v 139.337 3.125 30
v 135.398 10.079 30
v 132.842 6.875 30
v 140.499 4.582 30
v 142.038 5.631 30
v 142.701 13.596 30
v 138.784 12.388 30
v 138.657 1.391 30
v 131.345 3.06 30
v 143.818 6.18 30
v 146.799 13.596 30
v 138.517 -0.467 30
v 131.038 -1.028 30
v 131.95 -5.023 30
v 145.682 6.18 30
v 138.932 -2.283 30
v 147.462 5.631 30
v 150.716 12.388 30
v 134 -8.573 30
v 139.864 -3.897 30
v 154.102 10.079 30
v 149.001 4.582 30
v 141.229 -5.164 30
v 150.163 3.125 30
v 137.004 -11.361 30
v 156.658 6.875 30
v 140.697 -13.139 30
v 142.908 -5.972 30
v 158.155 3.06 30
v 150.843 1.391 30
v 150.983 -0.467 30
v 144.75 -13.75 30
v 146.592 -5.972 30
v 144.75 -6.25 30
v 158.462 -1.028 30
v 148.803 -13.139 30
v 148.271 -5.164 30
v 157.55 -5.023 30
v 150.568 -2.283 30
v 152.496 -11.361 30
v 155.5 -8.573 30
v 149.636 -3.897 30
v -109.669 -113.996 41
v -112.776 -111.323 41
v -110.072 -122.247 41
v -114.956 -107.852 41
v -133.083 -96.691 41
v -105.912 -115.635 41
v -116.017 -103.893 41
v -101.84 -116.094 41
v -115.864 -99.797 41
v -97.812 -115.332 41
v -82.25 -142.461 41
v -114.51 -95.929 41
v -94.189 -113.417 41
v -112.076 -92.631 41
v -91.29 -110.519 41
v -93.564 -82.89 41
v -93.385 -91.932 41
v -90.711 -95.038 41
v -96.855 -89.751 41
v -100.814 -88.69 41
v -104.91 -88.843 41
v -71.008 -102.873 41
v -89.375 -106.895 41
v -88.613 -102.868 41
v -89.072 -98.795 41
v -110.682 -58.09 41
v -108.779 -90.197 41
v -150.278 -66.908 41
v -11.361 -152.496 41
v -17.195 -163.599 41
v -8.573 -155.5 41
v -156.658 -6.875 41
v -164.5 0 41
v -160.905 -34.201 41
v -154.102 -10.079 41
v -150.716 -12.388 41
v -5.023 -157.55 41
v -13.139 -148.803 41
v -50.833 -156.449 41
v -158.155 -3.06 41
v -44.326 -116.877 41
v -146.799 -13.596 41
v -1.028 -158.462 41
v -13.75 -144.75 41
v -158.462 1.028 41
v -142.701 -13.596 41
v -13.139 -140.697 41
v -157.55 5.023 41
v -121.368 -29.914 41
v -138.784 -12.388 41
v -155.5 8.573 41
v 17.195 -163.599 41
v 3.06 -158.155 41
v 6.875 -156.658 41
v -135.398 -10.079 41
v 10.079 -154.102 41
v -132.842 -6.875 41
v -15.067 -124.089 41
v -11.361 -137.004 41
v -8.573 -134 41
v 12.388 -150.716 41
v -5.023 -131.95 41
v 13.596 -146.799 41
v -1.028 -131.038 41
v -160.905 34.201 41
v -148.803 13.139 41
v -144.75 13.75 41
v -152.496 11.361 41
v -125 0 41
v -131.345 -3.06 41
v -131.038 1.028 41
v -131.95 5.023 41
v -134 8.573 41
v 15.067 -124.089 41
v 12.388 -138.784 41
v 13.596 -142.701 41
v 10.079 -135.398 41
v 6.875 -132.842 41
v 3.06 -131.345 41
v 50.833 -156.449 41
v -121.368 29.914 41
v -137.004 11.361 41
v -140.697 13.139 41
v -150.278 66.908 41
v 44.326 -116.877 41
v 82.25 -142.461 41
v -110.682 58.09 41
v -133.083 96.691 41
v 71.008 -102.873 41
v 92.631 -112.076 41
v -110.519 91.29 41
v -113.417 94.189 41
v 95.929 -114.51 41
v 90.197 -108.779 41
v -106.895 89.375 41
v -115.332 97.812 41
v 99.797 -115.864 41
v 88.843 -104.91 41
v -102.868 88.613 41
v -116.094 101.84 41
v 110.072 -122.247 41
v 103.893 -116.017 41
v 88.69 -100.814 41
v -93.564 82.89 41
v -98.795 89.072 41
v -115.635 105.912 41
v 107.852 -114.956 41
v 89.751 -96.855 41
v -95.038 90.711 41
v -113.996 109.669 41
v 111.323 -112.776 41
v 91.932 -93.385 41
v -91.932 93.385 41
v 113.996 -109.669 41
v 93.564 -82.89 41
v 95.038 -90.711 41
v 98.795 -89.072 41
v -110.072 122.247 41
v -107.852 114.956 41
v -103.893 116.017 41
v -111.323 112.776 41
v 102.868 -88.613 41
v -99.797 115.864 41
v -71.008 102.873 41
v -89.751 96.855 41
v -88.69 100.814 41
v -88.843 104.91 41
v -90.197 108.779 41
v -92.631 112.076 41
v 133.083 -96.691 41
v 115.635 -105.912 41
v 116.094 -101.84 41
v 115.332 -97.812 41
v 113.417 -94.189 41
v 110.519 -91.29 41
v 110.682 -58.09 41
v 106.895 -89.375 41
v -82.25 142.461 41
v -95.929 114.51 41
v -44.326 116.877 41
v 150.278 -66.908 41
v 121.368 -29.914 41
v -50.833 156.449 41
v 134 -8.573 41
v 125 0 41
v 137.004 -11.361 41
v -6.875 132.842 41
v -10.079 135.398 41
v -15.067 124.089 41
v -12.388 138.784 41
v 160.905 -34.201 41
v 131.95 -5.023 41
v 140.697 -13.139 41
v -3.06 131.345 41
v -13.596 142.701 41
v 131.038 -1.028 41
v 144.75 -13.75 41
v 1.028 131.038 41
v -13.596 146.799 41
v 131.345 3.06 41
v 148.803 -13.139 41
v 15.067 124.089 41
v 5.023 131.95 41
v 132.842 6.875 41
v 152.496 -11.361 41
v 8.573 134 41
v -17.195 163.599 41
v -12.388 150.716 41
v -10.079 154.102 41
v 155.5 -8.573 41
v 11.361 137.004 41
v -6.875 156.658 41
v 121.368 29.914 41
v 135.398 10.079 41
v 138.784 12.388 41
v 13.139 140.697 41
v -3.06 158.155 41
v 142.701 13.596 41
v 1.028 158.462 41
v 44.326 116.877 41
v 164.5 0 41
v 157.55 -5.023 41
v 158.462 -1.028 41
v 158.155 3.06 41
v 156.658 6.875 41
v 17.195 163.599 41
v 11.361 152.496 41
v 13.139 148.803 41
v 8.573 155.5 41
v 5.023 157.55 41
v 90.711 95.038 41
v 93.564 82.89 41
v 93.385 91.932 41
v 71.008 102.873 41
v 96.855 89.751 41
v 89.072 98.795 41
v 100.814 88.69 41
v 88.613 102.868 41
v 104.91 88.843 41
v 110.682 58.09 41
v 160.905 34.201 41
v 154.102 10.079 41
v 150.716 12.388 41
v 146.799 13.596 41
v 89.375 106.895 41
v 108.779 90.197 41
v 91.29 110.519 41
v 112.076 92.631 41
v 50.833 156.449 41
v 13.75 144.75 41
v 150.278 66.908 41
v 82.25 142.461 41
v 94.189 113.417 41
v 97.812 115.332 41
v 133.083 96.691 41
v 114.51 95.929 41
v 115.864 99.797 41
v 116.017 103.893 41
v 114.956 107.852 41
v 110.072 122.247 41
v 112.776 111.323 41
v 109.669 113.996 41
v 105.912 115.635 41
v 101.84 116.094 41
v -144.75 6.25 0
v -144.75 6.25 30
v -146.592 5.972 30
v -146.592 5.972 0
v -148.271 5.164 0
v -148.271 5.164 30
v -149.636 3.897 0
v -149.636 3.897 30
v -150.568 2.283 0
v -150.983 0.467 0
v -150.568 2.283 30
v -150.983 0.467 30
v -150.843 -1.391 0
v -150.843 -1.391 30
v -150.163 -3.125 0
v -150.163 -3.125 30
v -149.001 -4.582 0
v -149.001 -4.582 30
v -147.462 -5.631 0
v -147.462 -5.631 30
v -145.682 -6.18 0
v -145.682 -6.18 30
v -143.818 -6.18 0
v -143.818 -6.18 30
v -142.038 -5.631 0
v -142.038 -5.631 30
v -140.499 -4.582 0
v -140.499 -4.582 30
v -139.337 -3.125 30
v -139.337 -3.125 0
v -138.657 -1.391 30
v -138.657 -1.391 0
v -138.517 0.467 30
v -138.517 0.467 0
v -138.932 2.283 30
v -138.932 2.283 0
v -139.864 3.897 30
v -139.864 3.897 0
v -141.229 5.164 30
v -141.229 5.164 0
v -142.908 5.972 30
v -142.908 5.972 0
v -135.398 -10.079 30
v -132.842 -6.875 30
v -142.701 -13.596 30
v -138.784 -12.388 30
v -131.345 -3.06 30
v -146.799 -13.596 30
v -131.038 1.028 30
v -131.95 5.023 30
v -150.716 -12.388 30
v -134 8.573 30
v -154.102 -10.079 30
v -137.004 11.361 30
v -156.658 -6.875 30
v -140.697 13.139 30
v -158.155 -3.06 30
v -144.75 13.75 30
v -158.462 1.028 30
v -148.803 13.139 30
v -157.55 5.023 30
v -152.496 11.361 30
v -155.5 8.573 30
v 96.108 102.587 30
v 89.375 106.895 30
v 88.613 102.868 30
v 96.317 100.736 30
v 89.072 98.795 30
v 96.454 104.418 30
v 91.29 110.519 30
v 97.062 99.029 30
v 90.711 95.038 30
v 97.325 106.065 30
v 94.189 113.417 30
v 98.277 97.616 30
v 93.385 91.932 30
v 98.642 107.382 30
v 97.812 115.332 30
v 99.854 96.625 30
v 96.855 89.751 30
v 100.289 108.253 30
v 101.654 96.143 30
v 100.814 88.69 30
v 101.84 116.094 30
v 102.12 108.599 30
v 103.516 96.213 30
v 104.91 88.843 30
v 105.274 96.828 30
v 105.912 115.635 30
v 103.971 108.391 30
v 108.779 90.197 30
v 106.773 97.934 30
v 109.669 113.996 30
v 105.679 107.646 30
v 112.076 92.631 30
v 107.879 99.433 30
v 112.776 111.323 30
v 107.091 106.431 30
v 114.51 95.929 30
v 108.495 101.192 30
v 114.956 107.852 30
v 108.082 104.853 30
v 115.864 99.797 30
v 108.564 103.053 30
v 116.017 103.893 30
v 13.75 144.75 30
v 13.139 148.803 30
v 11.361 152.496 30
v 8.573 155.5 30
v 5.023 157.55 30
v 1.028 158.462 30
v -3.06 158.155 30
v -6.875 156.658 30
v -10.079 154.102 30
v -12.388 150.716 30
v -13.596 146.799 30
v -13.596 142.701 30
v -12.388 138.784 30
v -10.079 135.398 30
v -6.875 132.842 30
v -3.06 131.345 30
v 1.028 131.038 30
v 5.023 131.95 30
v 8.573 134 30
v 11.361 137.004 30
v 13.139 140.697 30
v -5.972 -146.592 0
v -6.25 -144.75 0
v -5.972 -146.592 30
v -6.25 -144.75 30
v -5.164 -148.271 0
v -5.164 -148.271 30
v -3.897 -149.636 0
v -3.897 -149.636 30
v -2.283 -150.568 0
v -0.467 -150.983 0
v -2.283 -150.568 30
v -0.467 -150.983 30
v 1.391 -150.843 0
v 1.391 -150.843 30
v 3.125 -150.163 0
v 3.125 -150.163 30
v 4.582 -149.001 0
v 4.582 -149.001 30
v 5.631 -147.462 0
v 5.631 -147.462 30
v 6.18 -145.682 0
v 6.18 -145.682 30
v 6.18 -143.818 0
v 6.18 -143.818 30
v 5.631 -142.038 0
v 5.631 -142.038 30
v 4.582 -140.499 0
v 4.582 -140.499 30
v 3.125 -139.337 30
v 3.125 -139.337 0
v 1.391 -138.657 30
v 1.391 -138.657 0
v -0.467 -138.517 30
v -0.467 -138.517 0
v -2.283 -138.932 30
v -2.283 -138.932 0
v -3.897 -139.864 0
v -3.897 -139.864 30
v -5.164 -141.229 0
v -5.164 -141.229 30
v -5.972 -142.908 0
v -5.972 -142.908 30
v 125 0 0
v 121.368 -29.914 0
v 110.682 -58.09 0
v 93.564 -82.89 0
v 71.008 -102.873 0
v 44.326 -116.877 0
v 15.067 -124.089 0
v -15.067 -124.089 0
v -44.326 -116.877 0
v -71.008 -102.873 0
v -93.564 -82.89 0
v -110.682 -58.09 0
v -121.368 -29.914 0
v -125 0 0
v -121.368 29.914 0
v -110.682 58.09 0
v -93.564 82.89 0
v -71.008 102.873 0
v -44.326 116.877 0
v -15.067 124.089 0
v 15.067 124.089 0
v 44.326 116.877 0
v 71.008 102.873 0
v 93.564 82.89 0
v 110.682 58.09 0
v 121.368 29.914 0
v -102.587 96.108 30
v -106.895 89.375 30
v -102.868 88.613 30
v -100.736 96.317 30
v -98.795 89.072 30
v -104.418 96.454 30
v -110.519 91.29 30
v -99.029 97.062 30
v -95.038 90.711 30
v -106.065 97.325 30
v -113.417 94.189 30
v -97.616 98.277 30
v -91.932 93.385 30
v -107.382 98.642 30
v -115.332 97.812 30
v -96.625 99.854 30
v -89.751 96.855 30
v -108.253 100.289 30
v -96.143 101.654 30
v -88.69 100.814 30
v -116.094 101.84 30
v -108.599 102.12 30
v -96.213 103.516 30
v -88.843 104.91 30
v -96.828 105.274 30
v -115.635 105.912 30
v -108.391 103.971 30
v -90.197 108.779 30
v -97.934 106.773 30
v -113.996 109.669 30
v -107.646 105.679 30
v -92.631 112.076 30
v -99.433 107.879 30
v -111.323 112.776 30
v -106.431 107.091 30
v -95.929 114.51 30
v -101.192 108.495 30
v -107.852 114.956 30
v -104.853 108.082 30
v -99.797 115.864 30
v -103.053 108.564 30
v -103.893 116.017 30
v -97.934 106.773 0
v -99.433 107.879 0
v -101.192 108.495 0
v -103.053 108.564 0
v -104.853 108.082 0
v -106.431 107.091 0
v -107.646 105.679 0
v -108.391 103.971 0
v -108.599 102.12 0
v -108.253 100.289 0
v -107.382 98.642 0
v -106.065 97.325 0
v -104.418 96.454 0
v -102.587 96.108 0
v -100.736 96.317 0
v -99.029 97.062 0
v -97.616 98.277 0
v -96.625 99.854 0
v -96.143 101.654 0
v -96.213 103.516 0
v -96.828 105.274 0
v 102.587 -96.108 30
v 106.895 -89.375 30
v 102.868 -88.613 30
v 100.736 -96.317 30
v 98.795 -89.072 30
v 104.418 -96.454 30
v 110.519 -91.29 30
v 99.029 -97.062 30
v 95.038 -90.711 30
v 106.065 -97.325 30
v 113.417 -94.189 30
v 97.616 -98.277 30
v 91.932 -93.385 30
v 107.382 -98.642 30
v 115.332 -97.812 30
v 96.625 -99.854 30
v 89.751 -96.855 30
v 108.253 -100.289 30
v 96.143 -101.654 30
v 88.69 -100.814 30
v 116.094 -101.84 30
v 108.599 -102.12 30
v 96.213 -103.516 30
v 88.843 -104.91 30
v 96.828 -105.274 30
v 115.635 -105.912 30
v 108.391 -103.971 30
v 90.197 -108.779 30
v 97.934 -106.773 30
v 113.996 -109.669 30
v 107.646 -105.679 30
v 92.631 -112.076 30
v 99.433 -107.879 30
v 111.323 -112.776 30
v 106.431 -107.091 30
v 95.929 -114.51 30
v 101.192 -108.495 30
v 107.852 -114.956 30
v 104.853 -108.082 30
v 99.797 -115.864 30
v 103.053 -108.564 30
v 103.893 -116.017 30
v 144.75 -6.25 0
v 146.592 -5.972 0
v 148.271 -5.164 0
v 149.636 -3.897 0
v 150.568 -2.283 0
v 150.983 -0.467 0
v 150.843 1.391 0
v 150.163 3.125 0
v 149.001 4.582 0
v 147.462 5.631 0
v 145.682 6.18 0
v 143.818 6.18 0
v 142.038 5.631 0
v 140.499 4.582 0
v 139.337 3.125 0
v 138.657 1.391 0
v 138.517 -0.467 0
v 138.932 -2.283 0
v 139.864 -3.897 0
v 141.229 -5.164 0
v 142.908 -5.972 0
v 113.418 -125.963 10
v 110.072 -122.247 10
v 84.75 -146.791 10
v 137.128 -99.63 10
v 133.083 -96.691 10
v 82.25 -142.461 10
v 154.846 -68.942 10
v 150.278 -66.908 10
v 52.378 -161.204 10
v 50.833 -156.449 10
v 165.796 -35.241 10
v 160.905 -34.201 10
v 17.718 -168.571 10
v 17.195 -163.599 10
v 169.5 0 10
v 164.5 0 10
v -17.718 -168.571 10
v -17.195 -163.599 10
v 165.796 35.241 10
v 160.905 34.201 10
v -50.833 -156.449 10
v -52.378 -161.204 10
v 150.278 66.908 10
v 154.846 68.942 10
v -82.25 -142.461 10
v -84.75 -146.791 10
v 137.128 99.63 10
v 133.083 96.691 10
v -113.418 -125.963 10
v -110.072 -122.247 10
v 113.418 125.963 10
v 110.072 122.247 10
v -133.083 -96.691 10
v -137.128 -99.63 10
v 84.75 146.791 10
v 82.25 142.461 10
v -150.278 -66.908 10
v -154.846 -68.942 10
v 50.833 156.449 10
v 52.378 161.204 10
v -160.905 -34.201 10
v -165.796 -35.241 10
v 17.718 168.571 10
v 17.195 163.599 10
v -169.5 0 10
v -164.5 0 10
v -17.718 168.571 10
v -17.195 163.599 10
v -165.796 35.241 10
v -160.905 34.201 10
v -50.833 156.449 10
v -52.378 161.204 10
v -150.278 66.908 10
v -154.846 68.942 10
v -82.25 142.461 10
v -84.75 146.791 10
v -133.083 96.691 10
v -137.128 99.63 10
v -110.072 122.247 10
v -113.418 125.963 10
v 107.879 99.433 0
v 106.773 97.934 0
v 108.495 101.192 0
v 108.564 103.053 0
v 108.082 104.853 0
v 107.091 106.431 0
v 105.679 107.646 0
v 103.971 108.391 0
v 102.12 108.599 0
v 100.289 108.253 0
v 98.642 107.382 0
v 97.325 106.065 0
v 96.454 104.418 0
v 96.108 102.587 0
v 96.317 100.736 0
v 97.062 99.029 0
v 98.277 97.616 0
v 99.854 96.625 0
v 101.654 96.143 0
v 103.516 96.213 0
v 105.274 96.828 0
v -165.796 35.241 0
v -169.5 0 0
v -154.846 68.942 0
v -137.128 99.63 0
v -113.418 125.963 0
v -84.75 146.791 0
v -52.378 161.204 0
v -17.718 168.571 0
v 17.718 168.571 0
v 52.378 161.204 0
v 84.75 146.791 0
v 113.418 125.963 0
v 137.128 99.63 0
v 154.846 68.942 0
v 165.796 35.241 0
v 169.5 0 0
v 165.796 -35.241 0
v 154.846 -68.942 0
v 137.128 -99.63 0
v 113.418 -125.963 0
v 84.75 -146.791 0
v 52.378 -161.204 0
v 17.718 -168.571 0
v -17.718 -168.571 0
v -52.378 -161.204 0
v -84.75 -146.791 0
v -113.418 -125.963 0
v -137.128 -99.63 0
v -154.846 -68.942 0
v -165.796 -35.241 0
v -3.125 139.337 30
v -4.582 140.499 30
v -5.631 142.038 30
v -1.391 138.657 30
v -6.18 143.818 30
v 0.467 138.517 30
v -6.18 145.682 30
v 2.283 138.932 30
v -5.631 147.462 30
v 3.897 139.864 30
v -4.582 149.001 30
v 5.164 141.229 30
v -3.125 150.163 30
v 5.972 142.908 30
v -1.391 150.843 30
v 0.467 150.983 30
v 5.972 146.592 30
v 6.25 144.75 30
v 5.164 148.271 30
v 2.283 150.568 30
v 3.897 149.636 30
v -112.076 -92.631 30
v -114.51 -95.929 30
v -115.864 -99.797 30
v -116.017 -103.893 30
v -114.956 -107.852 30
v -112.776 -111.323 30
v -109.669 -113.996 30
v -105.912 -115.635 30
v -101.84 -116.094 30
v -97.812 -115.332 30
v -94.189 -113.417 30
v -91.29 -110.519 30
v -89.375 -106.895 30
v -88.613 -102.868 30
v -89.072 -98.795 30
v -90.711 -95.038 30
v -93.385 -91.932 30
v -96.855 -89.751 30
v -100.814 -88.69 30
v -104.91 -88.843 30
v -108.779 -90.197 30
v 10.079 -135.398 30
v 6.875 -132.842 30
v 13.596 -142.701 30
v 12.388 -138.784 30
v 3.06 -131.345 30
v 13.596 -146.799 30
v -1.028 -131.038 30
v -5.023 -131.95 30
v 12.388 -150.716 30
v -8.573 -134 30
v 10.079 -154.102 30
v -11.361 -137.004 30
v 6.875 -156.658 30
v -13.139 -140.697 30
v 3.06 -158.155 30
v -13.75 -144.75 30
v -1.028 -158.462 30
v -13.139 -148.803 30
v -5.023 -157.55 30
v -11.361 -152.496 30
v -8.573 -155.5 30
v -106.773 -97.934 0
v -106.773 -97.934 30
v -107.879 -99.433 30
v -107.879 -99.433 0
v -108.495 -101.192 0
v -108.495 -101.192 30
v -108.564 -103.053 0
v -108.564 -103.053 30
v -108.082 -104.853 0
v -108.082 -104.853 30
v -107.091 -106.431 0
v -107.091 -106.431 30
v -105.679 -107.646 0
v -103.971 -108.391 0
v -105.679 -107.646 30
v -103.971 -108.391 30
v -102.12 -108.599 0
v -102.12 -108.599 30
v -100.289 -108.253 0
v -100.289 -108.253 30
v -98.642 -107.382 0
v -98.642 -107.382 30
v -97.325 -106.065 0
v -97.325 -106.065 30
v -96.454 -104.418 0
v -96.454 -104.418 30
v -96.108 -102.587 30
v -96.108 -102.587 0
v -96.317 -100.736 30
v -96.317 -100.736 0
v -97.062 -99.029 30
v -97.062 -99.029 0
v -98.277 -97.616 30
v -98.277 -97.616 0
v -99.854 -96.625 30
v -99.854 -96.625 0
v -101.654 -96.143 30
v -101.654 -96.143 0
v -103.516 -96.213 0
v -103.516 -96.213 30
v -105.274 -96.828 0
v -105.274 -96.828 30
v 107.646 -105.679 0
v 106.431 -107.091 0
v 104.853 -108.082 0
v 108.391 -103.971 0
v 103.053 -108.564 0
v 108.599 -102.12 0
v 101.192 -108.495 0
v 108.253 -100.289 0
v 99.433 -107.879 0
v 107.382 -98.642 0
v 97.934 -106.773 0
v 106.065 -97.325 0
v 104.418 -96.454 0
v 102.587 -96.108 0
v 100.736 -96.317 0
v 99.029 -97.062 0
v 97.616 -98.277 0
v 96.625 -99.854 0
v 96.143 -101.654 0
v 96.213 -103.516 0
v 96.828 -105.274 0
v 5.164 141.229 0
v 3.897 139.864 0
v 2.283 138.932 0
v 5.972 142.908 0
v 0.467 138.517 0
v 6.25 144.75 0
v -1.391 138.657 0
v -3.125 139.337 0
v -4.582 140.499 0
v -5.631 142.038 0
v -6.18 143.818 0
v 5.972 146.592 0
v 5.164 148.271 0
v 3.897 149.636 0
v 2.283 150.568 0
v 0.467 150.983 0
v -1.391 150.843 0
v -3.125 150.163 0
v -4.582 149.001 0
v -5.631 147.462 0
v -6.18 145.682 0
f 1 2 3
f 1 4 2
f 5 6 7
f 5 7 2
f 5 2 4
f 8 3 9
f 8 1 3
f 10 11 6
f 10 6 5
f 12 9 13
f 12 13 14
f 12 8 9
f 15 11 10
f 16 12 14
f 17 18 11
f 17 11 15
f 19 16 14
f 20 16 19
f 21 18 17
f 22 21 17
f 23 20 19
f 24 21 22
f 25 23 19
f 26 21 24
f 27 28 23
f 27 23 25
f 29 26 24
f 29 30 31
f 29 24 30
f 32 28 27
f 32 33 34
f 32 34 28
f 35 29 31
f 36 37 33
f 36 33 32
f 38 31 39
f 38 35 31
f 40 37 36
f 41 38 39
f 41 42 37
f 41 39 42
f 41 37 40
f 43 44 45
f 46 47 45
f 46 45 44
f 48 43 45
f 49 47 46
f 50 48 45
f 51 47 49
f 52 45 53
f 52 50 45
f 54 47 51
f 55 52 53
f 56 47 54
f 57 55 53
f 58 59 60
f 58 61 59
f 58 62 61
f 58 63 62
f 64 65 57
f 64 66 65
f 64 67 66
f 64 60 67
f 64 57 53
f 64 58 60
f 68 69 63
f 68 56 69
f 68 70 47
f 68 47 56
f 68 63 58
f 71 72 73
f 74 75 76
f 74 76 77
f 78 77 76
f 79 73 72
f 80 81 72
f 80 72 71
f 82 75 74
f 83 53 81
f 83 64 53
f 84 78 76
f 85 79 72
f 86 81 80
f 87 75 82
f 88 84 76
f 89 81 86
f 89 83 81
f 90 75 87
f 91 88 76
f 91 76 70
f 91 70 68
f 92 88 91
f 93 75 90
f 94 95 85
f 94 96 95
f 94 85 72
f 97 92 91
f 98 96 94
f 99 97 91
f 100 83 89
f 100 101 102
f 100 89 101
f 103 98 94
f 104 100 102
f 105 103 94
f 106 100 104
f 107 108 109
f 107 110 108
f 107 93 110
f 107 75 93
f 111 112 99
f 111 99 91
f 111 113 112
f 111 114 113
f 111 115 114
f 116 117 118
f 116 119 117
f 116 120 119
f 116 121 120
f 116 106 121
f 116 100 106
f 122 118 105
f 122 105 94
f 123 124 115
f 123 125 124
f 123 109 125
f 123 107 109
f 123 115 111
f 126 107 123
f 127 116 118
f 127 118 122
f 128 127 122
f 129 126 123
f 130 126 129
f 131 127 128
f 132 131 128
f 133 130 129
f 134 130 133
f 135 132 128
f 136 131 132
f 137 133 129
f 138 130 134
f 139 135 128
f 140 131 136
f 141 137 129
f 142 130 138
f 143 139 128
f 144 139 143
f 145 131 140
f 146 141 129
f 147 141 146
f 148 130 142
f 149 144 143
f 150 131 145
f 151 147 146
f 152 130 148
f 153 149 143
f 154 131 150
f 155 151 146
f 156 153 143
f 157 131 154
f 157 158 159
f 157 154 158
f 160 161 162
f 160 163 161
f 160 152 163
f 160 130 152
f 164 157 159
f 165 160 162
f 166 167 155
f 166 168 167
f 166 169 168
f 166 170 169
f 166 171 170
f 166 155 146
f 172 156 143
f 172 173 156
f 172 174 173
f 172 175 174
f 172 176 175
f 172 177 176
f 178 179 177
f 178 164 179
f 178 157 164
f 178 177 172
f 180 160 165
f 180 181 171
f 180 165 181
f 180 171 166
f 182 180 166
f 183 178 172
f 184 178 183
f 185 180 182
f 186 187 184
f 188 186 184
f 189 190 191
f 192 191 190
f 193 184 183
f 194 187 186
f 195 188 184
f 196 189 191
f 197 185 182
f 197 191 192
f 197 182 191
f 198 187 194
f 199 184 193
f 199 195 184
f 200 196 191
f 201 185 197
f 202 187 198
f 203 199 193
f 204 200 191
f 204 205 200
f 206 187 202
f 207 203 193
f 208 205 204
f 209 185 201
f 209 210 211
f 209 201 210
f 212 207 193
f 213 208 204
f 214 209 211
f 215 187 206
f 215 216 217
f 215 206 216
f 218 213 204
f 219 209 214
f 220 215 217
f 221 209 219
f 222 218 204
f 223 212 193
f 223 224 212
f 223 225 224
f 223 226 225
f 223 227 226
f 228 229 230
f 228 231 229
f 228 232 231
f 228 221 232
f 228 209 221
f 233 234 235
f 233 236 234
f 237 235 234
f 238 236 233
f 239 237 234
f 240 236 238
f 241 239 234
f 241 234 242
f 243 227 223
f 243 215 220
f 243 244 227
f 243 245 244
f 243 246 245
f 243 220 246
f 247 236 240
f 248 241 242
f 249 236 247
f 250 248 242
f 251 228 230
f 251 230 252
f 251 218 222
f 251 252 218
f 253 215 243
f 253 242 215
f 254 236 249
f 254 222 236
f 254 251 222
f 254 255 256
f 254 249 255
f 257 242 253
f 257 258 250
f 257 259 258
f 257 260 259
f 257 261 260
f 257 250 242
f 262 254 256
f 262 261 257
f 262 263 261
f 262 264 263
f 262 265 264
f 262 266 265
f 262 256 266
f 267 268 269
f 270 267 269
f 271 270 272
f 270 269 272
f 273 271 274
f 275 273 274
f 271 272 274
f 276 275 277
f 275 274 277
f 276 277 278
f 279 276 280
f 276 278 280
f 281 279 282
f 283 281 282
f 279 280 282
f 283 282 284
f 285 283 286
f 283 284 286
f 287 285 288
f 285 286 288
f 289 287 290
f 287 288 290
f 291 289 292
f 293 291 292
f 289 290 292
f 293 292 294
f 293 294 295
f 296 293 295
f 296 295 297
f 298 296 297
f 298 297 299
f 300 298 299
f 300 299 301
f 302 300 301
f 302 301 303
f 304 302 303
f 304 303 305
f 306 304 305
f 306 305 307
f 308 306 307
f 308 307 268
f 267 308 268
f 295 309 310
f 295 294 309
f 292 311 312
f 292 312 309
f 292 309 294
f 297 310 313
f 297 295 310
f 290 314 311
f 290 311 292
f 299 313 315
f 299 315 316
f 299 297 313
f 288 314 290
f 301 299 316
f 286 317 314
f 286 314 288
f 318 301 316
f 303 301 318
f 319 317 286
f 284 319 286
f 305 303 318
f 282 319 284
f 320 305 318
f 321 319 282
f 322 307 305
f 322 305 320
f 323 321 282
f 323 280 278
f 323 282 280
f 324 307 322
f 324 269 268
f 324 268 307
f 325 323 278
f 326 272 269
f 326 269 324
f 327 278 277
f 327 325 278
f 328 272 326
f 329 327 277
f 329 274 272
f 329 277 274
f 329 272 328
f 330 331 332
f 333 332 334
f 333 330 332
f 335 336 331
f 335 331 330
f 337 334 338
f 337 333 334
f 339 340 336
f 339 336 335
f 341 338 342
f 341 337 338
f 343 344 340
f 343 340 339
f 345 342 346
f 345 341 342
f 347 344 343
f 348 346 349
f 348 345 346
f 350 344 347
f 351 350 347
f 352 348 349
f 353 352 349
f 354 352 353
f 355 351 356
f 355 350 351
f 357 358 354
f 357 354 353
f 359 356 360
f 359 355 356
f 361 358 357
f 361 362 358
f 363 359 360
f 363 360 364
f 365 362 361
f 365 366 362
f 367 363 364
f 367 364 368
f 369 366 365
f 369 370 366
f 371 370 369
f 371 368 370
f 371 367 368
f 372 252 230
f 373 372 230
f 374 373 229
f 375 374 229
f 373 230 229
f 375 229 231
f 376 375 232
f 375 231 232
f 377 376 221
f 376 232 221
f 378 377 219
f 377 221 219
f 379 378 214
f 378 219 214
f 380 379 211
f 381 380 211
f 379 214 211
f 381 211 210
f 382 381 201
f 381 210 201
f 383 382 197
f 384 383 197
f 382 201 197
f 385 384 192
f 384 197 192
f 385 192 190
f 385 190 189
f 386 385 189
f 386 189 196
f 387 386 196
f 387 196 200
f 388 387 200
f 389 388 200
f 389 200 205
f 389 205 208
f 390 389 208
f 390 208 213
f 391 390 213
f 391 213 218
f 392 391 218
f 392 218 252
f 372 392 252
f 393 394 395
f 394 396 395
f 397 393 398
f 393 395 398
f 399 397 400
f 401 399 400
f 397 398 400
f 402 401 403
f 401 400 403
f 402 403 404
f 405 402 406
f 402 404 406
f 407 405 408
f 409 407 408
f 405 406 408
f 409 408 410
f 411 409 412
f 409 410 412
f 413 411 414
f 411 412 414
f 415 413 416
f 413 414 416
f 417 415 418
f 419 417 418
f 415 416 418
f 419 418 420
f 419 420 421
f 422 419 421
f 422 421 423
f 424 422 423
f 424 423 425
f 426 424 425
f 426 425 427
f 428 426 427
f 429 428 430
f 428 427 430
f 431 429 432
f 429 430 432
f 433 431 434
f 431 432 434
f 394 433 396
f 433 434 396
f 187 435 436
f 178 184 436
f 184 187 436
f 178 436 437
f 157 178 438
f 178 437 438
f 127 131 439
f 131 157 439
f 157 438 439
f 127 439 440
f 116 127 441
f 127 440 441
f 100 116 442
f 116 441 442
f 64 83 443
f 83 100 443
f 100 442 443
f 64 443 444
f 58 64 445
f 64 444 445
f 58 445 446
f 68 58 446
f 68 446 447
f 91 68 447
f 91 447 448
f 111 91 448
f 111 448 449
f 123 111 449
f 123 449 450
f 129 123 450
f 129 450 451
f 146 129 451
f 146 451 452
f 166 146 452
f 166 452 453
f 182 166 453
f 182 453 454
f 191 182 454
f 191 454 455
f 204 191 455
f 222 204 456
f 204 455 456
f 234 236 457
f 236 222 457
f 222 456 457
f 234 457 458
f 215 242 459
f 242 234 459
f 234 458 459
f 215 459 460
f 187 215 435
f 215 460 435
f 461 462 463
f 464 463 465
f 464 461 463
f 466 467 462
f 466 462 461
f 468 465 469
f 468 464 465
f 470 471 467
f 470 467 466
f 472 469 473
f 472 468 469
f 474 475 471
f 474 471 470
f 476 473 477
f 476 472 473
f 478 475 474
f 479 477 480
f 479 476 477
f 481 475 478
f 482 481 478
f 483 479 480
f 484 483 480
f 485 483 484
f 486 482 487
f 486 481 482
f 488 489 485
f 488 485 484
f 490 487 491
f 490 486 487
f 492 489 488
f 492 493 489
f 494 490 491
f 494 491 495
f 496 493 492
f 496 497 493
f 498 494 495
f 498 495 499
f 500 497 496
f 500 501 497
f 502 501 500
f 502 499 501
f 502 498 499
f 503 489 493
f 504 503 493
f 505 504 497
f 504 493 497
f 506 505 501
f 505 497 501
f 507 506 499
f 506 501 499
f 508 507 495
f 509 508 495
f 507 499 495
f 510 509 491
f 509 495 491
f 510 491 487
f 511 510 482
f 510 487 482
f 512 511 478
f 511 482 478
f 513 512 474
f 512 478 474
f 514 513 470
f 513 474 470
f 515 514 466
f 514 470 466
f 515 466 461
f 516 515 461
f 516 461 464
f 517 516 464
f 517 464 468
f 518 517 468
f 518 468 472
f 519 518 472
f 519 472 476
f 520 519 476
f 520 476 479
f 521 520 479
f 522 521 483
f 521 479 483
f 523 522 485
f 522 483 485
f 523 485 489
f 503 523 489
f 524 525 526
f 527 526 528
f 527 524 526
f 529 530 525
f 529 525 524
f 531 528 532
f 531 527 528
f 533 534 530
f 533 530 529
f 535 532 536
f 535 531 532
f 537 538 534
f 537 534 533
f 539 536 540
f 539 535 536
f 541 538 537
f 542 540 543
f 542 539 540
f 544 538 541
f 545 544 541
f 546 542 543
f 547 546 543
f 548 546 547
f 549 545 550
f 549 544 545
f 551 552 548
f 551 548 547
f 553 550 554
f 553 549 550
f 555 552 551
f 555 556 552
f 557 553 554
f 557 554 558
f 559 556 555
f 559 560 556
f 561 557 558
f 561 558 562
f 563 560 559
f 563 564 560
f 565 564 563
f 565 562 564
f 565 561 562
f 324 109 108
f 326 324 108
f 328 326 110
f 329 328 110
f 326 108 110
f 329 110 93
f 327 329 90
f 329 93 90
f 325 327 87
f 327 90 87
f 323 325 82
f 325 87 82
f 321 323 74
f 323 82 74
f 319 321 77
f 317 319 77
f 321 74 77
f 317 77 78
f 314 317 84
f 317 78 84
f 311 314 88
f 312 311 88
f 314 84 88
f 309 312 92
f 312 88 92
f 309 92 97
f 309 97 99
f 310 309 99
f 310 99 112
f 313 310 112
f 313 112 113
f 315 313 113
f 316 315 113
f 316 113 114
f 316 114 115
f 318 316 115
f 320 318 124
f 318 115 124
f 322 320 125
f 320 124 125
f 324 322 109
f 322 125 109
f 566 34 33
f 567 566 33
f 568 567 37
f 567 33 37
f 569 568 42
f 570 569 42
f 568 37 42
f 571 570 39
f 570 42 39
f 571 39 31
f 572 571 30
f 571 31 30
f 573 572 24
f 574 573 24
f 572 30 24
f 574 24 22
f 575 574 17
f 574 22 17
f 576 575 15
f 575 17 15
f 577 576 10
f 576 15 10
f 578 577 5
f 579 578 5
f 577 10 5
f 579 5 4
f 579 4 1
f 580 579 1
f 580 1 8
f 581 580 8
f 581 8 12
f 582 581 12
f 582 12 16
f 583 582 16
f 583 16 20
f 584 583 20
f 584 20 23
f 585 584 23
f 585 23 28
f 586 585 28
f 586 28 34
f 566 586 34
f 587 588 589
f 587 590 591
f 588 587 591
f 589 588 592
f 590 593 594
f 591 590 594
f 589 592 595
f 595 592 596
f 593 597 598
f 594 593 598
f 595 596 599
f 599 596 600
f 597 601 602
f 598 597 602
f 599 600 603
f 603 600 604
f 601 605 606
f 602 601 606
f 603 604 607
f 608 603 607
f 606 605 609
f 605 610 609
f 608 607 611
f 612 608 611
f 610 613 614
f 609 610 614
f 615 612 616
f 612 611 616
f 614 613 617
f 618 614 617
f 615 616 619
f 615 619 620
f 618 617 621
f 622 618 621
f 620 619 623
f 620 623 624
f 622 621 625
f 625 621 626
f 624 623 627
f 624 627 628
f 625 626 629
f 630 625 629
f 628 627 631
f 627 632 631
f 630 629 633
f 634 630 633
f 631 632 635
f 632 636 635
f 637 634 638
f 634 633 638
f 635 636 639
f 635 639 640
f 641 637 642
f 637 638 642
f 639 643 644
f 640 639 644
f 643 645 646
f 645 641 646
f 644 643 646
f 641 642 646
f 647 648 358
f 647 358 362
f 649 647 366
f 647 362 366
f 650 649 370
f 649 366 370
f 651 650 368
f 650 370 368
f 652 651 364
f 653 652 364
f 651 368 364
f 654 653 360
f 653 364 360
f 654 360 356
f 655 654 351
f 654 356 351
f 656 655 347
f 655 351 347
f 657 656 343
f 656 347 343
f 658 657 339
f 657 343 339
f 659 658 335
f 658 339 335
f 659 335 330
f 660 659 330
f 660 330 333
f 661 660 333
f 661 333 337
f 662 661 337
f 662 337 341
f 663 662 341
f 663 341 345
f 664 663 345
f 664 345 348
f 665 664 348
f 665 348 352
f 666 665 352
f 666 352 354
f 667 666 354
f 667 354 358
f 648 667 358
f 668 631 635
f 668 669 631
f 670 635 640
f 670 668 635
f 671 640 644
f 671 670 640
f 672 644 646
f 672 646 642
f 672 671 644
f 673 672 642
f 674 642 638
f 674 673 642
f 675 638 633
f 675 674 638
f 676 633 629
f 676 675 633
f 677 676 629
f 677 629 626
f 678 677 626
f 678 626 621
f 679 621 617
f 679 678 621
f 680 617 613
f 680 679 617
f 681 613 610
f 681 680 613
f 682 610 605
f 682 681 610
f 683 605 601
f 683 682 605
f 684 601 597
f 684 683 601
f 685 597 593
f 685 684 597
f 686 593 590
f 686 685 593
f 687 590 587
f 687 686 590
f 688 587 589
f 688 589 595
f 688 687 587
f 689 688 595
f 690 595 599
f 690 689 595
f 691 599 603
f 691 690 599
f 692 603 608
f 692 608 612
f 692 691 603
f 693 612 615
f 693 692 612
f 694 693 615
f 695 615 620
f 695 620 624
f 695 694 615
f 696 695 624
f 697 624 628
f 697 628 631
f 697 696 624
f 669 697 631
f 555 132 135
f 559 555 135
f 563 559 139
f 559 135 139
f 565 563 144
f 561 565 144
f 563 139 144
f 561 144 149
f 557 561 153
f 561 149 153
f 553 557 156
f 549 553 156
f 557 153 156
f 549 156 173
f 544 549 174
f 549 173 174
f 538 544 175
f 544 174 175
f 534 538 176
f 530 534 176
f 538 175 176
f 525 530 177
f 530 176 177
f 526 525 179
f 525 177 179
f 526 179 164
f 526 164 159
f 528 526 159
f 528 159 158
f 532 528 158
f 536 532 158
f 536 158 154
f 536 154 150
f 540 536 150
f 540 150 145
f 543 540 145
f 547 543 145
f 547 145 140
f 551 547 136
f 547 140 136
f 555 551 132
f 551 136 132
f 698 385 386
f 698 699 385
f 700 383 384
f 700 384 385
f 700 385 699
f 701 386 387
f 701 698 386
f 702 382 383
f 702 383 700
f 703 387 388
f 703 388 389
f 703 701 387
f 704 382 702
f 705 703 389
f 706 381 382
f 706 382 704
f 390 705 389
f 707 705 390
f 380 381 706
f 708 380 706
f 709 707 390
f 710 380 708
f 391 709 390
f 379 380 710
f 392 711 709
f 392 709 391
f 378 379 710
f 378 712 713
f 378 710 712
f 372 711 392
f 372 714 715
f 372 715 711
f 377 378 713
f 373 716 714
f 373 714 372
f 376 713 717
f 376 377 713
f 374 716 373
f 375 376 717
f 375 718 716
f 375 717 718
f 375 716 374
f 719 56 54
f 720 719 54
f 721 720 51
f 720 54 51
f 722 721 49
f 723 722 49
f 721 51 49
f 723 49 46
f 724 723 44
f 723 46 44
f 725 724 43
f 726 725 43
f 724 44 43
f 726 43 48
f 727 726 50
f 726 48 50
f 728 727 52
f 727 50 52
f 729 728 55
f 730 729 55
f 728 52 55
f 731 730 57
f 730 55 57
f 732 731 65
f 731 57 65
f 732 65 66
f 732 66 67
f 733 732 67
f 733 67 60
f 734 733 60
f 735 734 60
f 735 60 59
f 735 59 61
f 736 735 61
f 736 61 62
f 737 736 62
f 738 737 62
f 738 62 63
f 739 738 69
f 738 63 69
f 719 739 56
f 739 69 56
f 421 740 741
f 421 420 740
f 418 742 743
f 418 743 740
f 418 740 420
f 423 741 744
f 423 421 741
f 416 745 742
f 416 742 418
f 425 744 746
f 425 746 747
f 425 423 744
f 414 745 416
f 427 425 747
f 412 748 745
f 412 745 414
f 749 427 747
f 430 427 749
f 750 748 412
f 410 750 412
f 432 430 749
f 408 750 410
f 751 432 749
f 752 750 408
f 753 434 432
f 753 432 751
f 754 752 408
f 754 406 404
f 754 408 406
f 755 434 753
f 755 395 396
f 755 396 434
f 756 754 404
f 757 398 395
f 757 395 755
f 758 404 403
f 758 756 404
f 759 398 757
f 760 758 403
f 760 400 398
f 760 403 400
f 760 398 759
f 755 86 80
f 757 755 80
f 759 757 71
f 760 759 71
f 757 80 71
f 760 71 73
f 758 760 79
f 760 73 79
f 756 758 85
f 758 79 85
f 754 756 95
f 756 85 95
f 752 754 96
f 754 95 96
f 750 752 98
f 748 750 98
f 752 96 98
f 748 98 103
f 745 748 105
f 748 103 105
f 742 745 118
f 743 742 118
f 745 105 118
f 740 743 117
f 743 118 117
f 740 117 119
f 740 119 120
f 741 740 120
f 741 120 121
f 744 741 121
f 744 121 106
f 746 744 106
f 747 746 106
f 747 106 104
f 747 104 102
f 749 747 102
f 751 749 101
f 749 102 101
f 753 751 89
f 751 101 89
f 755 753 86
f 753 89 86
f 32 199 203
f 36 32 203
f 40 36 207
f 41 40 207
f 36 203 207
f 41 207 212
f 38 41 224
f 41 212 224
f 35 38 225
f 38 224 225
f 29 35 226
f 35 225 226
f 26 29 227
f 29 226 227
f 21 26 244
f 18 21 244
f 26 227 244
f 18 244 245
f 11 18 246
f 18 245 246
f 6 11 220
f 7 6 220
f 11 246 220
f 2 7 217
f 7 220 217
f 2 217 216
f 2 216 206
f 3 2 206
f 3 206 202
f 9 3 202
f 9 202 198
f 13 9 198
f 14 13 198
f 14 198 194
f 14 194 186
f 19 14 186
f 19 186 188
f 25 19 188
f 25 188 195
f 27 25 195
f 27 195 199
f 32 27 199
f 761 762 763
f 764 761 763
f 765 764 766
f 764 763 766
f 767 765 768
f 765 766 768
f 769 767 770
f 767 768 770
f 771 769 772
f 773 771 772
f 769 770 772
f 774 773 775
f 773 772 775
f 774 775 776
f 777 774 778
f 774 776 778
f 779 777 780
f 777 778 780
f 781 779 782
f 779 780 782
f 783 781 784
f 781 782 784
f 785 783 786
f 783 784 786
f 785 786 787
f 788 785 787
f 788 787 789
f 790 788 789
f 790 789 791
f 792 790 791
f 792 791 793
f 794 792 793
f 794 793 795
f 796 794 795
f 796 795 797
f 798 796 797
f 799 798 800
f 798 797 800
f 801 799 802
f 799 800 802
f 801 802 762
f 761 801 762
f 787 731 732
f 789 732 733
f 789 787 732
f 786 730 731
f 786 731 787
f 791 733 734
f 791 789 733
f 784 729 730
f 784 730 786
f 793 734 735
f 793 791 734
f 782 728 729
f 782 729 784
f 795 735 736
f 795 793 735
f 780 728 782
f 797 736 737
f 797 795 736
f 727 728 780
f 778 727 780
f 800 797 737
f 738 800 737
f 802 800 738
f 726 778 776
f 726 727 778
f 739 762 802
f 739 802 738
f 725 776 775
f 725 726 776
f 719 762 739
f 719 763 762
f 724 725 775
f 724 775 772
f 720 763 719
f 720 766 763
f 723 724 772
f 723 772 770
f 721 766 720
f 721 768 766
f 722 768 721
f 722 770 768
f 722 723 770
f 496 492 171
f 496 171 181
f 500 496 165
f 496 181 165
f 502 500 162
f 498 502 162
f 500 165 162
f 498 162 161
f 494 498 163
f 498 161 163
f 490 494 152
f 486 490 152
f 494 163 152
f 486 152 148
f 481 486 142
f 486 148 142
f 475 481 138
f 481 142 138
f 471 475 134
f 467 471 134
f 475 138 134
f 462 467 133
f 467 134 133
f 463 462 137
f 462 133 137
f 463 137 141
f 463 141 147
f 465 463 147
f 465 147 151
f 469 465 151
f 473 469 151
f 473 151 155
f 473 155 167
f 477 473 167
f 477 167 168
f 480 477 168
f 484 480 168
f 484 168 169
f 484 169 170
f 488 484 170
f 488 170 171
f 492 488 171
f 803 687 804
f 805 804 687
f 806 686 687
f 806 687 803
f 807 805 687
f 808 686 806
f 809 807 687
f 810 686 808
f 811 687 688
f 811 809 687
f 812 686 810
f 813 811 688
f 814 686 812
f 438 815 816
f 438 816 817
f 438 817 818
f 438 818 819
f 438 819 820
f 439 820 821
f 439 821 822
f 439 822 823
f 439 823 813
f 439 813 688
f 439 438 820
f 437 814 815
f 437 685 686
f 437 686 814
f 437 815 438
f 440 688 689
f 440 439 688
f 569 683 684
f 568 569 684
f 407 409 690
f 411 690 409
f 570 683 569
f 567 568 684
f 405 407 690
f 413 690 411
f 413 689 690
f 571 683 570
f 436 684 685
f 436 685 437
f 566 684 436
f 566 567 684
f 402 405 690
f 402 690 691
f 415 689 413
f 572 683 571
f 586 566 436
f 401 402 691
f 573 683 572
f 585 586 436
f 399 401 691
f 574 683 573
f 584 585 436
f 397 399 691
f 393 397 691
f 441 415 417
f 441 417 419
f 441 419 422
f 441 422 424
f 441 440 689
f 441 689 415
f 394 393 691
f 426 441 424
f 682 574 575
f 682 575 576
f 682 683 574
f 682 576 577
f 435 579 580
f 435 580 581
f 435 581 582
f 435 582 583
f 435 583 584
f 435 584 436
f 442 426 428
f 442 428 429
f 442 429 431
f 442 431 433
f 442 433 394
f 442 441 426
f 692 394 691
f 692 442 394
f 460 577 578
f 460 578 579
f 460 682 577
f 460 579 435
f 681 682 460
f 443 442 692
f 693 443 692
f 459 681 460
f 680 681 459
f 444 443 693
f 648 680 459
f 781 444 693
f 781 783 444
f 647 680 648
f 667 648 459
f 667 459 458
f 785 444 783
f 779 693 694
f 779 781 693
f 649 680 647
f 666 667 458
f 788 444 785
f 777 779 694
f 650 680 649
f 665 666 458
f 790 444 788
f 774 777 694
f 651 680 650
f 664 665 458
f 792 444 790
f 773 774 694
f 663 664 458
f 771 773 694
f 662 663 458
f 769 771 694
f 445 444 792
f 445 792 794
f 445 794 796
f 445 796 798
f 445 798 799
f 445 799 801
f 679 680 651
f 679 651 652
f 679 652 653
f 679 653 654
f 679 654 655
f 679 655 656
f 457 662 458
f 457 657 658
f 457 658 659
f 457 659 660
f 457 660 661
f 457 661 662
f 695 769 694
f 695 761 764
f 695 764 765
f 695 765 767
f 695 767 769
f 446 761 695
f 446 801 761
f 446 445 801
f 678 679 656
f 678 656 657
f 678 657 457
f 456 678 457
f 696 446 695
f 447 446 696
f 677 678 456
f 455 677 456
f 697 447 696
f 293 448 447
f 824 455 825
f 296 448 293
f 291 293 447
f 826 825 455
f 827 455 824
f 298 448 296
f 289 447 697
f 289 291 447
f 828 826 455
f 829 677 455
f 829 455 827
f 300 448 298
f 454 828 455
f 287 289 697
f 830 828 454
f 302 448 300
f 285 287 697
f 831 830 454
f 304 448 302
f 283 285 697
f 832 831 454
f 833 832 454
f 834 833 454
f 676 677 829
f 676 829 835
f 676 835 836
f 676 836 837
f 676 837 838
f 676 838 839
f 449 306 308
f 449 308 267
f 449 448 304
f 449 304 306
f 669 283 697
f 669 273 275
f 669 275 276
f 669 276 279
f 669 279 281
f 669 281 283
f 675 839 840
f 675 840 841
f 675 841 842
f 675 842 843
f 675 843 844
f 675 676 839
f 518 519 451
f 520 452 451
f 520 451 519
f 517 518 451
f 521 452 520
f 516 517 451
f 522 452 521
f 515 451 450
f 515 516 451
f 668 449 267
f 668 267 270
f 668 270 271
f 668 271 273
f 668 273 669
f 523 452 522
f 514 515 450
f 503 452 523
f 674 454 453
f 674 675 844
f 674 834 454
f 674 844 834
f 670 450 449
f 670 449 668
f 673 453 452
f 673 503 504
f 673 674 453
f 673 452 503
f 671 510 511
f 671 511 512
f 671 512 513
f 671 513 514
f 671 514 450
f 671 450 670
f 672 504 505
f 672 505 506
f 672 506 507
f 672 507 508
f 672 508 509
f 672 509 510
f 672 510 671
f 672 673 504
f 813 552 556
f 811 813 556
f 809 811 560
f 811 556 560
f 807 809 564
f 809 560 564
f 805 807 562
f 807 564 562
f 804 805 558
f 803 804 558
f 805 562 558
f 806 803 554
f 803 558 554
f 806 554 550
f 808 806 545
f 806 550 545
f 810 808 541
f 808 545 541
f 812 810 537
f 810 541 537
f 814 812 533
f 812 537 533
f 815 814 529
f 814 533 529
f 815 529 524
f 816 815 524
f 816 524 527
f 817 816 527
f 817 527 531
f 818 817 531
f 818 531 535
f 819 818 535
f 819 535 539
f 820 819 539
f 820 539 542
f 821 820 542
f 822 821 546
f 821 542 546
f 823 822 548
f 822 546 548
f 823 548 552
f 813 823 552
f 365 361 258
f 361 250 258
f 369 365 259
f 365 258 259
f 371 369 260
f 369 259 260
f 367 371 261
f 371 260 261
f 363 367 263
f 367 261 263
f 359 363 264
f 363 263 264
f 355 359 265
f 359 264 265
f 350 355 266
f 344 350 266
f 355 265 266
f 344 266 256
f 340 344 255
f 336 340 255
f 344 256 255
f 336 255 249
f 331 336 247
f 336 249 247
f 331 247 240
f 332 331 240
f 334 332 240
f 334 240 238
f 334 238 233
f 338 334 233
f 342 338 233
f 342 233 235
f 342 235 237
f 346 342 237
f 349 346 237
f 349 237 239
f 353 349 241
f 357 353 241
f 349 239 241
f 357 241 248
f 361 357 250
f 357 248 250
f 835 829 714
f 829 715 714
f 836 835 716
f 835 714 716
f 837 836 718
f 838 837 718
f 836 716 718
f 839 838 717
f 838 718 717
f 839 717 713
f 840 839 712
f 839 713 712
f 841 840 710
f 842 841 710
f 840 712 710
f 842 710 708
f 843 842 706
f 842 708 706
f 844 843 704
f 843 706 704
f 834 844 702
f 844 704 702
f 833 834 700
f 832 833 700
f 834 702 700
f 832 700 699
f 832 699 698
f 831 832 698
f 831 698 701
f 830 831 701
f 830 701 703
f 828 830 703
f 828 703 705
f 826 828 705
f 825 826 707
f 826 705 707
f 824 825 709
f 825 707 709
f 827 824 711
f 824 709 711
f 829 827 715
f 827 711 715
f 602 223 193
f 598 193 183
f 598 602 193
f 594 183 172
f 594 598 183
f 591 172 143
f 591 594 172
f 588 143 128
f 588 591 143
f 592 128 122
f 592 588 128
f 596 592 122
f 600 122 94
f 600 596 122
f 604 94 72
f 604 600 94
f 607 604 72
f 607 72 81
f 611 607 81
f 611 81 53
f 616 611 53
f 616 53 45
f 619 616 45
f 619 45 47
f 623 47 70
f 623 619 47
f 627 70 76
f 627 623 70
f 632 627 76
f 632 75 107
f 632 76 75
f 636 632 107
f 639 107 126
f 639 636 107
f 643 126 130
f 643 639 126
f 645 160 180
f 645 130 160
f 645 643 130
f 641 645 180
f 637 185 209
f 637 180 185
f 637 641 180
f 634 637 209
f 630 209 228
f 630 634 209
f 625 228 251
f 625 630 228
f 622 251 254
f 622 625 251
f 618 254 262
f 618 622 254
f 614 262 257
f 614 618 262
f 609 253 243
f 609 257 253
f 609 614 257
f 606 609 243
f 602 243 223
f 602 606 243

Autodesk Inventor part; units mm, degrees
ref_plane "YZ Plane" through (0, 0, 0) normal (1, 0, 0) x (0, 1, 0)
ref_plane "XZ Plane" through (0, 0, 0) normal (0, 1, 0) x (-1, 0, 0)
ref_plane "XY Plane" through (0, 0, 0) normal (0, 0, 1) x (1, 0, 0)
sketch "Sketch1" plane through (0, 0, 0) normal (0, 0, 1) x (1, 0, 0)
  circle A0 centre (0, 0) radius 125
  circle A1 centre (0, 0) radius 164.5
  dimension "d0" = 39.5
  dimension "d1" = 250
extrude "Extrusion1" add sketch "Sketch1" along normal blind 41
sketch "Sketch2" plane through (0, 0, 41) normal (0, 0, 1) x (1, 0, 0)
  circle A0 centre (0, 0) radius 164.5 construction
  circle A1 centre (0, 0) radius 125 construction
  line L0 (0, 164.5) -> (0, 125) construction
  circle A2 centre (0, 144.75) radius 6.25
  dimension "d4" = 12.5
extrude "Extrusion2" cut sketch "Sketch2" against normal through all
sketch "Sketch3" plane through (0, 0, 41) normal (0, 0, 1) x (1, 0, 0)
  circle A0 centre (0, 144.75) radius 6.25 projected
  circle A1 centre (0, 144.75) radius 13.75
  point P0 (0, 0)
  dimension "d10" = 27.5
extrude "Extrusion3" cut sketch "Sketch3" against normal blind 11
pattern_circular "Circular Pattern1" count 8 over 360 about axis through (0, 0, 0) along (0, 0, 1) of "Extrusion2", "Extrusion3"
sketch "Sketch4" plane through (0, 0, 0) normal (0, 0, -1) x (-1, 0, 0)
  circle A0 centre (0, 0) radius 164.5 projected
  circle A1 centre (0, 0) radius 169.5
  dimension "d13" = 5
extrude "Extrusion4" add sketch "Sketch4" against normal blind 10
equation "\"d1\" = Вал_ось_диаметр_НОС"
equation "\"Вал_ось_диаметр_НОС\" = 250"
properties part number "ДМФ 01 31 Барабан Опорное кольцо НОС v2.0"
